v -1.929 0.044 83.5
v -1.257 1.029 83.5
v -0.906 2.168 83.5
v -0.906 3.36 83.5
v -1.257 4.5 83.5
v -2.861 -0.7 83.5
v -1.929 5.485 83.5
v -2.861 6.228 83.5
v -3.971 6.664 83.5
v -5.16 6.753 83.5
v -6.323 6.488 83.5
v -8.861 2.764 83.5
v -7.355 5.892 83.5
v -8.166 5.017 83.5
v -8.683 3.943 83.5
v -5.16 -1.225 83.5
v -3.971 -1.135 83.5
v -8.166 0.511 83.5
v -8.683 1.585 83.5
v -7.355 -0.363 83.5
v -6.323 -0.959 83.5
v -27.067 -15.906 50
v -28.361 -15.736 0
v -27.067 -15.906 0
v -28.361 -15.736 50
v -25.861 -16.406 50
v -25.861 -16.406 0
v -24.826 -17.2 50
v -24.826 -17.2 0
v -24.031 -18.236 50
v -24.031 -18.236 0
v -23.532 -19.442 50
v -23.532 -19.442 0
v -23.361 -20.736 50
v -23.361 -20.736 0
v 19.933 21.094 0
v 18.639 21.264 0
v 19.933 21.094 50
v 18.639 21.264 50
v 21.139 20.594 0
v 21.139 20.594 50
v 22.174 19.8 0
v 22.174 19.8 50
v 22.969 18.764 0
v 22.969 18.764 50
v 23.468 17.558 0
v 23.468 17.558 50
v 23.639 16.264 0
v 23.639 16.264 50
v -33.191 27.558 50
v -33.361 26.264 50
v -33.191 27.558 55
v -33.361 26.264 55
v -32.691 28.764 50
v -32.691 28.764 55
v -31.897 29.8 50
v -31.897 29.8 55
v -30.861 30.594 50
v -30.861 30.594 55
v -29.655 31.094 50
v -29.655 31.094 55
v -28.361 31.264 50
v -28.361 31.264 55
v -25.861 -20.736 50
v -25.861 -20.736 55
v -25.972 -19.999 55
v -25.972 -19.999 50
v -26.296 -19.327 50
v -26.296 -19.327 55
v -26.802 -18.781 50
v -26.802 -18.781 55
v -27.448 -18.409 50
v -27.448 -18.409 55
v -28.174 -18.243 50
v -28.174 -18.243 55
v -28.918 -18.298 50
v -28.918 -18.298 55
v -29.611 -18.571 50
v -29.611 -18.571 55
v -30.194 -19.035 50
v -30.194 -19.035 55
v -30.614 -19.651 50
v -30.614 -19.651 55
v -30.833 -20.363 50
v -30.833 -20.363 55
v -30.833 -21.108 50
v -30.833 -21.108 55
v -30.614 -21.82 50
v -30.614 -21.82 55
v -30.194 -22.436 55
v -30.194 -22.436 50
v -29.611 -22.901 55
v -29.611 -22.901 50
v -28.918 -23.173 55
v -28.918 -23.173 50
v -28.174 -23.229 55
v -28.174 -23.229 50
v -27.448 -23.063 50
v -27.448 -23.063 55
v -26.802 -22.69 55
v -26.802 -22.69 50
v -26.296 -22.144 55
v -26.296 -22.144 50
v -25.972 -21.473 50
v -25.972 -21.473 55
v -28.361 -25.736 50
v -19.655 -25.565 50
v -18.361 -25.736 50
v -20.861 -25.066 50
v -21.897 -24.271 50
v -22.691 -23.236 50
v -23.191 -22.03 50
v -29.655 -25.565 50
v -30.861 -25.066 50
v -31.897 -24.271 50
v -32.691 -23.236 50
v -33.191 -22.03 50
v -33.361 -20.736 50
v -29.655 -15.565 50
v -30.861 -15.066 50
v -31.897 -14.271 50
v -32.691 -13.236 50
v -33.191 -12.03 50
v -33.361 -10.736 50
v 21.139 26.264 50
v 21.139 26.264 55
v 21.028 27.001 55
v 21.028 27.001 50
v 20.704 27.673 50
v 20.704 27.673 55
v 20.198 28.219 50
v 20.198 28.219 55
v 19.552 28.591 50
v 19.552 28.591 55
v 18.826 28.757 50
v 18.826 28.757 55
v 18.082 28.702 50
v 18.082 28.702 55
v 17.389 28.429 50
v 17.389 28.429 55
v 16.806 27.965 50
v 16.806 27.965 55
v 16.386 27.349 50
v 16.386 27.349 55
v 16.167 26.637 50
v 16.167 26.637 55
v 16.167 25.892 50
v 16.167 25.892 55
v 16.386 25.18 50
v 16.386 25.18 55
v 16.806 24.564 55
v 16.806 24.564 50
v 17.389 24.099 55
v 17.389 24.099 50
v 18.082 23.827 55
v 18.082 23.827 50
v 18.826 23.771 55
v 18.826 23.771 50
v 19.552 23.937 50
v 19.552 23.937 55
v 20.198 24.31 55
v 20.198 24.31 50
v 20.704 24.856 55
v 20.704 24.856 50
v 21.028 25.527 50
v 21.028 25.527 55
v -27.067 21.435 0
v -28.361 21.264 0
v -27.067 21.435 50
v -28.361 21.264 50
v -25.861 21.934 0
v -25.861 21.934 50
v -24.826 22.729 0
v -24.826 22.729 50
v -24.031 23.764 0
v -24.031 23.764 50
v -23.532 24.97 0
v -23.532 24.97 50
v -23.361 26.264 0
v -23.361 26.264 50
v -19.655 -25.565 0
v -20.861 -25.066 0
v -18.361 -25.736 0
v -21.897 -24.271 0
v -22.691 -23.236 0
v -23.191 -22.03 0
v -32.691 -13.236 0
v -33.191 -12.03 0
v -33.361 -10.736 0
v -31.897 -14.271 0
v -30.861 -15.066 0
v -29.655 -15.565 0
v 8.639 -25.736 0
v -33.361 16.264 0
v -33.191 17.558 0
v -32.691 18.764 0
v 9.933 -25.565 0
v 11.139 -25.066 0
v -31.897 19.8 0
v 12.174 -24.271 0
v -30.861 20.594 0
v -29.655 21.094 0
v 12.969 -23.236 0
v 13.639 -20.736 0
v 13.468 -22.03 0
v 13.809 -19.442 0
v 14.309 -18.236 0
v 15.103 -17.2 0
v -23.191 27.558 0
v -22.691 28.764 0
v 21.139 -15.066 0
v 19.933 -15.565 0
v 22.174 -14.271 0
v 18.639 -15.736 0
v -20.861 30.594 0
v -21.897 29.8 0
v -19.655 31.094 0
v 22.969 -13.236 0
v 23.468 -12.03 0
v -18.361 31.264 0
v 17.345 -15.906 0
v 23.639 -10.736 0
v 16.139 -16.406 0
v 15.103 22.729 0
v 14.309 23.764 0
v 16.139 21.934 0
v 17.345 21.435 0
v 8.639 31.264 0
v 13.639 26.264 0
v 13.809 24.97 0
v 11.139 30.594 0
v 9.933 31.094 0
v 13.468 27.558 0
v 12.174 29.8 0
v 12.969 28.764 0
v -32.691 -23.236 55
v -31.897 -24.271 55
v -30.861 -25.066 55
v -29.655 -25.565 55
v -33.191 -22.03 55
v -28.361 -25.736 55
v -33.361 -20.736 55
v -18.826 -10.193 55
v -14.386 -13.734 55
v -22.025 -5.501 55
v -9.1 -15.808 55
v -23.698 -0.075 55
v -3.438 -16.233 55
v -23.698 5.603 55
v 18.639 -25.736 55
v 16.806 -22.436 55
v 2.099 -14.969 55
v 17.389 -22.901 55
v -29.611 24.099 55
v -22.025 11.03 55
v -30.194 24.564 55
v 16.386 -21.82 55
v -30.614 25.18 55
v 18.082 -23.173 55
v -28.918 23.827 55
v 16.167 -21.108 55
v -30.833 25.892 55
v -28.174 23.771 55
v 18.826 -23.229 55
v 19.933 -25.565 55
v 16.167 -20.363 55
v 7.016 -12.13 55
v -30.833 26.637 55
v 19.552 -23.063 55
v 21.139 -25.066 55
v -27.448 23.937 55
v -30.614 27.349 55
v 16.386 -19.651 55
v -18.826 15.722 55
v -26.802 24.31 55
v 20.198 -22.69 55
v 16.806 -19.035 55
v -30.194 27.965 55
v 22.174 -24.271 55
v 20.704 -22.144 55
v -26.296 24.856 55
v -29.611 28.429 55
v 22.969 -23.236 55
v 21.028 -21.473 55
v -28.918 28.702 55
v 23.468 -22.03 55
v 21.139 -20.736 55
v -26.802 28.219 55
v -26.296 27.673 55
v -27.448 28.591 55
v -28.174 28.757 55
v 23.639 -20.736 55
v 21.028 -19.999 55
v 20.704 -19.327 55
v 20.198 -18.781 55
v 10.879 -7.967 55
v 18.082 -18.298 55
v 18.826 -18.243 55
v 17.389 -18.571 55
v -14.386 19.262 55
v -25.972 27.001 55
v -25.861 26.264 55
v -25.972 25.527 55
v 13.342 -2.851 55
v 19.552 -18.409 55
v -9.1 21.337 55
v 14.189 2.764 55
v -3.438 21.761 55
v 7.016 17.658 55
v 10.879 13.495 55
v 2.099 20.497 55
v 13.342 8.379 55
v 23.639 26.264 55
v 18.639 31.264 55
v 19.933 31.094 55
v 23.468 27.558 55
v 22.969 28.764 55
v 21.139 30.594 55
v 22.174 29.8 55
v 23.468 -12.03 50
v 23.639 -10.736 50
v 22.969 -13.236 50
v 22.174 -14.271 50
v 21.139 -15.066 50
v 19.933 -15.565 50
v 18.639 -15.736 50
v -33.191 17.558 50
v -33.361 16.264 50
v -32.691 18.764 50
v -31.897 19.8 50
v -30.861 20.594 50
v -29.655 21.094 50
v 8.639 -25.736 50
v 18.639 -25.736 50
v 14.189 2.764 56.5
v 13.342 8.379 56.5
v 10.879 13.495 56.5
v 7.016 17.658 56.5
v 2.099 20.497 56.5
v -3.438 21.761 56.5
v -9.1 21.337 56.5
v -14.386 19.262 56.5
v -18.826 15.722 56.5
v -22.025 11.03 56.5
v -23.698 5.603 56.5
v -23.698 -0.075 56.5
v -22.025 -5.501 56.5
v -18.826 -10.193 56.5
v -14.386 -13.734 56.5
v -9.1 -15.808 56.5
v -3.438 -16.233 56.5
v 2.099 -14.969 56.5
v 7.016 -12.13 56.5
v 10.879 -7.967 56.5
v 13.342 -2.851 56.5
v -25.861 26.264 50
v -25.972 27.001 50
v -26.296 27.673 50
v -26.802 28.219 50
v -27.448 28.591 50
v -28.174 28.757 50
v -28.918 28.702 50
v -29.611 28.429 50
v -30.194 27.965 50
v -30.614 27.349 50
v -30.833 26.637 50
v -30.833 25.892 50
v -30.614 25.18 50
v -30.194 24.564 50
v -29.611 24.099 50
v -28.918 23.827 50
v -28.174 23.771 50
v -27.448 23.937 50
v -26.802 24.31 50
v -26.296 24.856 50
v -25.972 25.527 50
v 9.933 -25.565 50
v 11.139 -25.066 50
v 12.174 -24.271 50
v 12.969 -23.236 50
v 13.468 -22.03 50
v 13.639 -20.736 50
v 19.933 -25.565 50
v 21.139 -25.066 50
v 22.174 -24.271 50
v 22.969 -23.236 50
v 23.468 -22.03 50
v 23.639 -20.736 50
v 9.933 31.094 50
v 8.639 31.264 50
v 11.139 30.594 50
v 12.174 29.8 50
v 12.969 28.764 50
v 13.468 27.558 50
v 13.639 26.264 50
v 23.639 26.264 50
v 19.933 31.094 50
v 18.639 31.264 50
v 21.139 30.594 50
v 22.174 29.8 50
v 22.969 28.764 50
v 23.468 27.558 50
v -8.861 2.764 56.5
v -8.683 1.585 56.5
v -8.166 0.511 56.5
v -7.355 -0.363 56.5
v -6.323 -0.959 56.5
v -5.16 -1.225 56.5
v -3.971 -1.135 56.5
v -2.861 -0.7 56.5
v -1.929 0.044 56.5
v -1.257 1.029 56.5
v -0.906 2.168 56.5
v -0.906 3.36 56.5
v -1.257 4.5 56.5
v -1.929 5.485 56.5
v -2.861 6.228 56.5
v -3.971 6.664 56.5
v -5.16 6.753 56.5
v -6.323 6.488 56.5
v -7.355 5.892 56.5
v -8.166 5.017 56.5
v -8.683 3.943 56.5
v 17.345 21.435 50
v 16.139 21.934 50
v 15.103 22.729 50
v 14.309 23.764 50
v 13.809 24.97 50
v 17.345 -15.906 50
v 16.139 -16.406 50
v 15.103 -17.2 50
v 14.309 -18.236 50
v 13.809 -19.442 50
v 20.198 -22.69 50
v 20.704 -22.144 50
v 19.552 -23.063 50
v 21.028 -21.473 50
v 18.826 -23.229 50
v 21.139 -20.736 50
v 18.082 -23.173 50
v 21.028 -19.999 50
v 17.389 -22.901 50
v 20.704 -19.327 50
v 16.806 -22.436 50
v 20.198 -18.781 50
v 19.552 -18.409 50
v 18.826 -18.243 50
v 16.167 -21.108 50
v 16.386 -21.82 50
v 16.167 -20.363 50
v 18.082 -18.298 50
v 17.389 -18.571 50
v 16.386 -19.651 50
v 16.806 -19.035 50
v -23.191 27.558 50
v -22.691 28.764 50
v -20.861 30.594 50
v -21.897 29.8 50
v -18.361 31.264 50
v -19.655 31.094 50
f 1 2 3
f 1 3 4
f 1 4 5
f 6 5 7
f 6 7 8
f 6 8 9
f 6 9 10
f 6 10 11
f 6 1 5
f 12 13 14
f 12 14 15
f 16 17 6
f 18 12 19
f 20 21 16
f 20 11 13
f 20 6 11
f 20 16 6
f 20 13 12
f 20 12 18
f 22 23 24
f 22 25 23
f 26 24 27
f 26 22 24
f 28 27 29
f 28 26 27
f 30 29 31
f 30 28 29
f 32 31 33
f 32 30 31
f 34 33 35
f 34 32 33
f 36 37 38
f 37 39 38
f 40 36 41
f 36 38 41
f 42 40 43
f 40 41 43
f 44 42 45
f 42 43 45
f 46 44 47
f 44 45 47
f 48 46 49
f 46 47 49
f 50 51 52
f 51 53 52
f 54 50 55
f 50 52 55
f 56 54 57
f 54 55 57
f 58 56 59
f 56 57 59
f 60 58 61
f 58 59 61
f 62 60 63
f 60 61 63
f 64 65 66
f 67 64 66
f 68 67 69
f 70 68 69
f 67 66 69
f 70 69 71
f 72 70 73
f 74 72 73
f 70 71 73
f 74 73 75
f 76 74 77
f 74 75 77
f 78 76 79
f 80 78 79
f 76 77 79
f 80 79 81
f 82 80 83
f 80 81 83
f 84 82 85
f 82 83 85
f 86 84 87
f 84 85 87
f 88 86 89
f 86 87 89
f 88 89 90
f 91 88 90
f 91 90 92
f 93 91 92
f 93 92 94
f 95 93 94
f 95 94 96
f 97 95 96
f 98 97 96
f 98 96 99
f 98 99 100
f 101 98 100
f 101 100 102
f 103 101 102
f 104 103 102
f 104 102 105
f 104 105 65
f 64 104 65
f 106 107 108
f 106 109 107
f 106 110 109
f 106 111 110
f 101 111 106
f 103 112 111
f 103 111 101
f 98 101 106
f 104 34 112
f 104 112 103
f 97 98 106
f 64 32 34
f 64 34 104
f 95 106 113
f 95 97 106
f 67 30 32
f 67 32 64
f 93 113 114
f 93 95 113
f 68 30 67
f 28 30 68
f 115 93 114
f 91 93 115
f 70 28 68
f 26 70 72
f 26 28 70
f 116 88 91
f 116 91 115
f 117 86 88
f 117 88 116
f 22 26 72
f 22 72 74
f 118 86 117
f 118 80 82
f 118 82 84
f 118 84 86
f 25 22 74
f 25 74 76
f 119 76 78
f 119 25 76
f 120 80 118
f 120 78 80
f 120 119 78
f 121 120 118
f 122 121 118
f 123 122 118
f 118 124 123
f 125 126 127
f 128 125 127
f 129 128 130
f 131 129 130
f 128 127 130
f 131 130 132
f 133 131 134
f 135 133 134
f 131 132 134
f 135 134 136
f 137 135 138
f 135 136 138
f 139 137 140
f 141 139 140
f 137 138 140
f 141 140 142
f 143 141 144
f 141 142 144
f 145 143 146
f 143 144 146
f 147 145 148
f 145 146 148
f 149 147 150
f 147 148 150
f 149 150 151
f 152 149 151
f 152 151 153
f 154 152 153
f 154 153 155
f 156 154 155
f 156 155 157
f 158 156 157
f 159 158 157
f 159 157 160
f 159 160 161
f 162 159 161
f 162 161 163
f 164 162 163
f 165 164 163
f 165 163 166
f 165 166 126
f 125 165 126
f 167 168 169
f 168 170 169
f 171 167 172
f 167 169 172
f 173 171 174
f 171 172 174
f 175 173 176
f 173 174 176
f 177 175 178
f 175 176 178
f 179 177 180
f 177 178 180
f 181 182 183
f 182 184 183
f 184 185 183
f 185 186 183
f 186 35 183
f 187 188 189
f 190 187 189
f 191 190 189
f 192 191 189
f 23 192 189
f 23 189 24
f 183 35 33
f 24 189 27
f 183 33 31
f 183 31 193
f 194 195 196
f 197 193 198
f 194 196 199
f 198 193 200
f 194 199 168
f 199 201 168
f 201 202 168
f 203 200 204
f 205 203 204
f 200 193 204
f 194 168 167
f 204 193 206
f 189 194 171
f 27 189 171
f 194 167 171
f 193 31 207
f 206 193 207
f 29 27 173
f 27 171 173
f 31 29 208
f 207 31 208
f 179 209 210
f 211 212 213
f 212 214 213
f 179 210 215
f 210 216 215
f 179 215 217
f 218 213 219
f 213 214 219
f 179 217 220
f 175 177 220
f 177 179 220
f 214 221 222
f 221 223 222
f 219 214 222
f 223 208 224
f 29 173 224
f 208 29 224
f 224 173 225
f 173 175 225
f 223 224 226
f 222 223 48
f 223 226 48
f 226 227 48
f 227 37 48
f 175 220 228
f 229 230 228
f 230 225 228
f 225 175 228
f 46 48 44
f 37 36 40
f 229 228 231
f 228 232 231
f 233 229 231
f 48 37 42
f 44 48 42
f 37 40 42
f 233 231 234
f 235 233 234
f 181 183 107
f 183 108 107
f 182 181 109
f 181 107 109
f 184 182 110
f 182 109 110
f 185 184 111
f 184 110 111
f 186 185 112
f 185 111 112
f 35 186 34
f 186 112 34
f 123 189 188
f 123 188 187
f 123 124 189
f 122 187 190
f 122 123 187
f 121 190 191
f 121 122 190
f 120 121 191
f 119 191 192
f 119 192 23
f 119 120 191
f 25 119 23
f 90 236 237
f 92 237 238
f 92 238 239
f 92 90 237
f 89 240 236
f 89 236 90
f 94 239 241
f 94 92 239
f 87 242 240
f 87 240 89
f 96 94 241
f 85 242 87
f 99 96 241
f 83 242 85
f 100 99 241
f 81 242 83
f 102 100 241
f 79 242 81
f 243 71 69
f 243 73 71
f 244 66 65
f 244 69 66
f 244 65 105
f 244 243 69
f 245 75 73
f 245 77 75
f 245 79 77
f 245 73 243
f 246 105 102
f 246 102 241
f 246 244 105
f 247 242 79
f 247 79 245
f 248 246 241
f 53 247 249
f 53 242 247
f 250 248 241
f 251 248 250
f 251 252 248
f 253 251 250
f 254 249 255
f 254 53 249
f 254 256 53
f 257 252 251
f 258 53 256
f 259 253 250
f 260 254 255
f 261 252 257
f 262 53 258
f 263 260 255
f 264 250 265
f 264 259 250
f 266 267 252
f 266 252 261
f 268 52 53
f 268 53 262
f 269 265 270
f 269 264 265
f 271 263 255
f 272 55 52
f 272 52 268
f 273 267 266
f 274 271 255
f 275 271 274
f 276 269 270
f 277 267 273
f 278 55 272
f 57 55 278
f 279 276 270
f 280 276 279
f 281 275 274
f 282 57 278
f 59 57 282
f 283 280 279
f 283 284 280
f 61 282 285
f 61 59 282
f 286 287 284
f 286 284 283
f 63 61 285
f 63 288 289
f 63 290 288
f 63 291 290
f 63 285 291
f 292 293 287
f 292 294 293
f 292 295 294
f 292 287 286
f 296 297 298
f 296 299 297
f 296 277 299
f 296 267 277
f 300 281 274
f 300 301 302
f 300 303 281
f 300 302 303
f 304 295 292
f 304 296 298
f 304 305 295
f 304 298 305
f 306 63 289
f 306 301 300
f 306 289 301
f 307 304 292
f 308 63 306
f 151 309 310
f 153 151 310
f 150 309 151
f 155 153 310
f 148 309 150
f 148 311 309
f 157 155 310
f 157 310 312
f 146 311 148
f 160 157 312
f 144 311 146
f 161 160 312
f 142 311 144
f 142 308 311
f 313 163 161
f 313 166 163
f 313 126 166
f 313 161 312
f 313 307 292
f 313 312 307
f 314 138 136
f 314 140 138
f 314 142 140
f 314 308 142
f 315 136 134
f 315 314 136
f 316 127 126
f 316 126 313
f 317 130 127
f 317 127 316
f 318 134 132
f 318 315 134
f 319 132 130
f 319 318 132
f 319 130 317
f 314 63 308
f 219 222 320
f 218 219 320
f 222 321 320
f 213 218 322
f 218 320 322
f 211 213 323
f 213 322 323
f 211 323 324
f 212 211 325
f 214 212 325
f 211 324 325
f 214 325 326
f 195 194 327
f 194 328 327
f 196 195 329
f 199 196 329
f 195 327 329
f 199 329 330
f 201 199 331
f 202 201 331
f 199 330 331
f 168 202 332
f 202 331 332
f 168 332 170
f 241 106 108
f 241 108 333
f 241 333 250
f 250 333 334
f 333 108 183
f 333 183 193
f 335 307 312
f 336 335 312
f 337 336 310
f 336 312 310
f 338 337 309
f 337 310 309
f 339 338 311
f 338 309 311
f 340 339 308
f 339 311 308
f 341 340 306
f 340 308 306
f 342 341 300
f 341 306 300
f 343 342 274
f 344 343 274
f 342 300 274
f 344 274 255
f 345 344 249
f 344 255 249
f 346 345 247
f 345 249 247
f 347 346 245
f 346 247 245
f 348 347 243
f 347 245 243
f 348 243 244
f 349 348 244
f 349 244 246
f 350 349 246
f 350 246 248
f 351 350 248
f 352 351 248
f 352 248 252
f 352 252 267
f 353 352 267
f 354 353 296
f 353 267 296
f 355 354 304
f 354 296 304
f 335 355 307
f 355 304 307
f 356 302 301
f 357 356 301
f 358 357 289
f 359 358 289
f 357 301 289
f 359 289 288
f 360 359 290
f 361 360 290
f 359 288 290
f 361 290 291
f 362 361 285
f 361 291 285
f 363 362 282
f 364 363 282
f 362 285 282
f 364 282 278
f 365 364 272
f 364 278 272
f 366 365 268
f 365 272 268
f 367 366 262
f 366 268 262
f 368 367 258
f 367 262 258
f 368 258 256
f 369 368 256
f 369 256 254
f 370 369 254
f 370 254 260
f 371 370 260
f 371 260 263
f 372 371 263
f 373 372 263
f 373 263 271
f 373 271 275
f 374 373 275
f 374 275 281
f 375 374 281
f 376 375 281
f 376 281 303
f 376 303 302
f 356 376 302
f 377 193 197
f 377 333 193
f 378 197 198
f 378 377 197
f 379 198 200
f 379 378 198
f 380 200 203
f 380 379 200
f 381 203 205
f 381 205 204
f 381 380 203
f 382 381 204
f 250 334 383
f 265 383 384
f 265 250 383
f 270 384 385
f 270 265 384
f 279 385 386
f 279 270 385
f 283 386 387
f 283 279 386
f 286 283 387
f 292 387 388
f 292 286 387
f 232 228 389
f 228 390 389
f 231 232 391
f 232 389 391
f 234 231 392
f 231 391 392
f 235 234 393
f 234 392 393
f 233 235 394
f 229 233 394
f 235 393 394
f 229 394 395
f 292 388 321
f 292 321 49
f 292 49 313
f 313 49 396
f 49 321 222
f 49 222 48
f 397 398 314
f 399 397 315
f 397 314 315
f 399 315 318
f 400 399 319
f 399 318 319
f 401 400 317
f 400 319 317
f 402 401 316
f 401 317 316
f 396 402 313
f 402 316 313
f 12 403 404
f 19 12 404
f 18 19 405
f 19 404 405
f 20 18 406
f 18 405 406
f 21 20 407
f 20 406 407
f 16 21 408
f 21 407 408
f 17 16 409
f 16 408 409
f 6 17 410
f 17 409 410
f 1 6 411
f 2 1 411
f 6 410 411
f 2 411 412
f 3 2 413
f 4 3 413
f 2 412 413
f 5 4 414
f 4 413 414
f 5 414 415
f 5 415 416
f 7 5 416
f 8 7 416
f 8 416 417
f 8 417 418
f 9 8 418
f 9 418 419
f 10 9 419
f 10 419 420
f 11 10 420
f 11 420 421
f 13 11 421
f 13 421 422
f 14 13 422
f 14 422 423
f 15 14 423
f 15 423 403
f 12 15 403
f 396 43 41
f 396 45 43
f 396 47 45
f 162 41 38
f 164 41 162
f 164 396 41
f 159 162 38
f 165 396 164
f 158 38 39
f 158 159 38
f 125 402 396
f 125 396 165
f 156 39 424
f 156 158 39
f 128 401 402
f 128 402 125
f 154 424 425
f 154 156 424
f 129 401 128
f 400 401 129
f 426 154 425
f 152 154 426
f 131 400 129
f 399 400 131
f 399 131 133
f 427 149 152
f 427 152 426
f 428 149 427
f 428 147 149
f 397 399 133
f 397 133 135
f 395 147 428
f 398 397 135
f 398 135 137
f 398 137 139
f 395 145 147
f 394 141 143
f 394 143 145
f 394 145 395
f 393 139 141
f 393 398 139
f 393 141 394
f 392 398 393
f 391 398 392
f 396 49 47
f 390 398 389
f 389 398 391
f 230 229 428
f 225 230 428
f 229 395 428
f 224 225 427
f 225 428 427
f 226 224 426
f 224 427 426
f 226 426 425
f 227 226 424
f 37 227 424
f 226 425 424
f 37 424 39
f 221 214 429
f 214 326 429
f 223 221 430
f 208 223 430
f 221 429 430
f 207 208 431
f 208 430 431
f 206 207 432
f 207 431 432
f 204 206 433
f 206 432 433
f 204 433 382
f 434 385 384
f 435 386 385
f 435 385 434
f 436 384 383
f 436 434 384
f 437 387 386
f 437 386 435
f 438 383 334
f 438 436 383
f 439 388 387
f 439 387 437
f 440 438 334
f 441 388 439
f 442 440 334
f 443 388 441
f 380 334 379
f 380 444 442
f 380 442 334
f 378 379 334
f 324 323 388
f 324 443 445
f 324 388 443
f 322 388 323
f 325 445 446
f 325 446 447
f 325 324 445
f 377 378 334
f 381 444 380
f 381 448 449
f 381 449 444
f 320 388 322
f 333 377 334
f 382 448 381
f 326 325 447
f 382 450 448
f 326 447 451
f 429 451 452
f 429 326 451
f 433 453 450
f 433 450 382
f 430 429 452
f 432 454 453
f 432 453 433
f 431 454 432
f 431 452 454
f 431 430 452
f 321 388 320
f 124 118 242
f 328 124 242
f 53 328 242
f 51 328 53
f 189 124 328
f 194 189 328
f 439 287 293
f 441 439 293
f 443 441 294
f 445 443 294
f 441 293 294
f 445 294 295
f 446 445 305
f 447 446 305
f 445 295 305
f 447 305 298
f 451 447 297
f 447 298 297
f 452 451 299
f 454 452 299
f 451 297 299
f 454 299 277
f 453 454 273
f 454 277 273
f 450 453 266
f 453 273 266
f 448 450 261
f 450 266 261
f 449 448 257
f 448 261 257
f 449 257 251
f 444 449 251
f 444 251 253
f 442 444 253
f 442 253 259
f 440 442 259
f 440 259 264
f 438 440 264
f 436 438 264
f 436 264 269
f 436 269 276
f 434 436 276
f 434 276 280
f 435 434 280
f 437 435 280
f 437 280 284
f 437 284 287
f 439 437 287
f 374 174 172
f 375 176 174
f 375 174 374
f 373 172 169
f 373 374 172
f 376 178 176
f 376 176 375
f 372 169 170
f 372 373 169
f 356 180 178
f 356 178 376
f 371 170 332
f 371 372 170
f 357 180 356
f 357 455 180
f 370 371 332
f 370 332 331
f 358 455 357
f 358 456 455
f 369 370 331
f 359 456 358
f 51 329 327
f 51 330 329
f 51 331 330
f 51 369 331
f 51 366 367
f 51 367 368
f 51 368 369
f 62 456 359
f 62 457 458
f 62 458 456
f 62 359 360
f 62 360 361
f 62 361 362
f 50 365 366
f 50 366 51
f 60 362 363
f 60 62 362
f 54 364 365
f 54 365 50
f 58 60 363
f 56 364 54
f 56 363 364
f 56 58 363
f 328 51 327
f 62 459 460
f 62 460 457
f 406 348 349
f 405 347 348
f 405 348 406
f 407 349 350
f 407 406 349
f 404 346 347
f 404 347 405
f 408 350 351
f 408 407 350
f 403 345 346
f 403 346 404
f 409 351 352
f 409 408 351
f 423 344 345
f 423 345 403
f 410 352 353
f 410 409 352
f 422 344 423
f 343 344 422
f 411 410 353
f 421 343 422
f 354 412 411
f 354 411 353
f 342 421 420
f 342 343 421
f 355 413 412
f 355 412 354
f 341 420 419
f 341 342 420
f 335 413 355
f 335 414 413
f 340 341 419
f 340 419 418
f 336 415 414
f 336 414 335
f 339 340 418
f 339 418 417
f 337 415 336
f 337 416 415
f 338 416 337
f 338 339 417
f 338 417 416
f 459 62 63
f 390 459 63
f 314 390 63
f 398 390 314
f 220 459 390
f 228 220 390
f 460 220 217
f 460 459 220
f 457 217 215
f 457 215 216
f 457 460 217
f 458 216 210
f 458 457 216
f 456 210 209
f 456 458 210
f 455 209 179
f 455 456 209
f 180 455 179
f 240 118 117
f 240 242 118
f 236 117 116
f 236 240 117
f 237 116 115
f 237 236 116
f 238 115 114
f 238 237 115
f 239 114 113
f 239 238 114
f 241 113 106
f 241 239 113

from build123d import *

# Parameters (mm, degrees)
SKETCH1_W            = 57
SKETCH1_H            = 57
BOSS_EXTRUDE1_DEPTH  = 55
SKETCH2_W            = 10
SKETCH2_H            = 10
CUT_EXTRUDE1_DEPTH   = 50
LPATTERN1_COUNT      = 2
LPATTERN1_PITCH      = 47
LPATTERN1_COUNT_DIR2 = 2
LPATTERN1_PITCH_DIR2 = 47
SKETCH3_R            = 2.5
CUT_EXTRUDE2_DEPTH   = 50
LPATTERN2_COUNT      = 2
LPATTERN2_PITCH      = 47
LPATTERN2_COUNT_DIR2 = 2
LPATTERN2_PITCH_DIR2 = 47
FILLET1_R            = 5
SKETCH5_R            = 19.05
BOSS_EXTRUDE3_DEPTH  = 1.5
SKETCH4_R            = 4
BOSS_EXTRUDE2_DEPTH  = 28.5


with BuildPart() as part:
    # Sketch1 → Boss-Extrude1 (new body)
    with BuildSketch(Plane.XY):
        with Locations((-4.861204013, 2.764214047)):
            Rectangle(SKETCH1_W, SKETCH1_H)
    extrude(amount=BOSS_EXTRUDE1_DEPTH)

    # Sketch2 → Cut-Extrude1 (cut)
    with BuildSketch(Plane(origin=(0, 0, 0), x_dir=(-1, 0, 0), z_dir=(0, 0, -1))):
        with Locations((-18.638795987, 26.264214047)):
            Rectangle(SKETCH2_W, SKETCH2_H)
    cut_extrude1 = extrude(amount=-CUT_EXTRUDE1_DEPTH, mode=Mode.SUBTRACT)

    # LPattern1: Cut-Extrude1 2 × 2
    with Locations(*[(-i * LPATTERN1_PITCH, -j * LPATTERN1_PITCH_DIR2, 0) for i in range(LPATTERN1_COUNT) for j in range(LPATTERN1_COUNT_DIR2) if (i, j) != (0, 0)]):
        add(cut_extrude1, mode=Mode.SUBTRACT)

    # Sketch3 → Cut-Extrude2 (cut)
    with BuildSketch(Plane.XY.offset(55)):
        with Locations((-28.361204013, 26.264214047)):
            Circle(SKETCH3_R)
    cut_extrude2 = extrude(amount=-CUT_EXTRUDE2_DEPTH, mode=Mode.SUBTRACT)

    # LPattern2: Cut-Extrude2 2 × 2
    with Locations(*[(i * LPATTERN2_PITCH, -j * LPATTERN2_PITCH_DIR2, 0) for i in range(LPATTERN2_COUNT) for j in range(LPATTERN2_COUNT_DIR2) if (i, j) != (0, 0)]):
        add(cut_extrude2, mode=Mode.SUBTRACT)

    # Fillet1
    fillet1_edges = [part.edges().sort_by_distance(p)[0] for p in [
        (-33.361204013, 21.264214047, 25),
        (-23.361204013, 21.264214047, 25),
        (-23.361204013, 31.264214047, 25),
        (13.638795987, 31.264214047, 25),
        (13.638795987, 21.264214047, 25),
        (23.638795987, 21.264214047, 25),
        (23.638795987, -25.735785953, 52.5),
        (23.638795987, -15.735785953, 25),
        (13.638795987, -15.735785953, 25),
        (13.638795987, -25.735785953, 25),
        (-23.361204013, -25.735785953, 25),
        (-23.361204013, -15.735785953, 25),
        (-33.361204013, -15.735785953, 25),
        (-33.361204013, -25.735785953, 52.5),
        (-33.361204013, 31.264214047, 52.5),
        (23.638795987, 31.264214047, 52.5),
    ]]
    fillet(fillet1_edges, radius=FILLET1_R - 0.0001)  # a hair under: the kernel refuses the full size

    # Sketch5 → Boss-Extrude3 (add)
    with BuildSketch(Plane.XY.offset(55)):
        with Locations((-4.861204013, 2.764214047)):
            Circle(SKETCH5_R)
    extrude(amount=BOSS_EXTRUDE3_DEPTH)

    # Sketch4 → Boss-Extrude2 (add)
    with BuildSketch(Plane.XY.offset(55)):
        with Locations(Location((-4.861204013, 2.764214047, 0), (0, 0, 180))):
            Circle(SKETCH4_R)
    extrude(amount=BOSS_EXTRUDE2_DEPTH)


solid = part.part
